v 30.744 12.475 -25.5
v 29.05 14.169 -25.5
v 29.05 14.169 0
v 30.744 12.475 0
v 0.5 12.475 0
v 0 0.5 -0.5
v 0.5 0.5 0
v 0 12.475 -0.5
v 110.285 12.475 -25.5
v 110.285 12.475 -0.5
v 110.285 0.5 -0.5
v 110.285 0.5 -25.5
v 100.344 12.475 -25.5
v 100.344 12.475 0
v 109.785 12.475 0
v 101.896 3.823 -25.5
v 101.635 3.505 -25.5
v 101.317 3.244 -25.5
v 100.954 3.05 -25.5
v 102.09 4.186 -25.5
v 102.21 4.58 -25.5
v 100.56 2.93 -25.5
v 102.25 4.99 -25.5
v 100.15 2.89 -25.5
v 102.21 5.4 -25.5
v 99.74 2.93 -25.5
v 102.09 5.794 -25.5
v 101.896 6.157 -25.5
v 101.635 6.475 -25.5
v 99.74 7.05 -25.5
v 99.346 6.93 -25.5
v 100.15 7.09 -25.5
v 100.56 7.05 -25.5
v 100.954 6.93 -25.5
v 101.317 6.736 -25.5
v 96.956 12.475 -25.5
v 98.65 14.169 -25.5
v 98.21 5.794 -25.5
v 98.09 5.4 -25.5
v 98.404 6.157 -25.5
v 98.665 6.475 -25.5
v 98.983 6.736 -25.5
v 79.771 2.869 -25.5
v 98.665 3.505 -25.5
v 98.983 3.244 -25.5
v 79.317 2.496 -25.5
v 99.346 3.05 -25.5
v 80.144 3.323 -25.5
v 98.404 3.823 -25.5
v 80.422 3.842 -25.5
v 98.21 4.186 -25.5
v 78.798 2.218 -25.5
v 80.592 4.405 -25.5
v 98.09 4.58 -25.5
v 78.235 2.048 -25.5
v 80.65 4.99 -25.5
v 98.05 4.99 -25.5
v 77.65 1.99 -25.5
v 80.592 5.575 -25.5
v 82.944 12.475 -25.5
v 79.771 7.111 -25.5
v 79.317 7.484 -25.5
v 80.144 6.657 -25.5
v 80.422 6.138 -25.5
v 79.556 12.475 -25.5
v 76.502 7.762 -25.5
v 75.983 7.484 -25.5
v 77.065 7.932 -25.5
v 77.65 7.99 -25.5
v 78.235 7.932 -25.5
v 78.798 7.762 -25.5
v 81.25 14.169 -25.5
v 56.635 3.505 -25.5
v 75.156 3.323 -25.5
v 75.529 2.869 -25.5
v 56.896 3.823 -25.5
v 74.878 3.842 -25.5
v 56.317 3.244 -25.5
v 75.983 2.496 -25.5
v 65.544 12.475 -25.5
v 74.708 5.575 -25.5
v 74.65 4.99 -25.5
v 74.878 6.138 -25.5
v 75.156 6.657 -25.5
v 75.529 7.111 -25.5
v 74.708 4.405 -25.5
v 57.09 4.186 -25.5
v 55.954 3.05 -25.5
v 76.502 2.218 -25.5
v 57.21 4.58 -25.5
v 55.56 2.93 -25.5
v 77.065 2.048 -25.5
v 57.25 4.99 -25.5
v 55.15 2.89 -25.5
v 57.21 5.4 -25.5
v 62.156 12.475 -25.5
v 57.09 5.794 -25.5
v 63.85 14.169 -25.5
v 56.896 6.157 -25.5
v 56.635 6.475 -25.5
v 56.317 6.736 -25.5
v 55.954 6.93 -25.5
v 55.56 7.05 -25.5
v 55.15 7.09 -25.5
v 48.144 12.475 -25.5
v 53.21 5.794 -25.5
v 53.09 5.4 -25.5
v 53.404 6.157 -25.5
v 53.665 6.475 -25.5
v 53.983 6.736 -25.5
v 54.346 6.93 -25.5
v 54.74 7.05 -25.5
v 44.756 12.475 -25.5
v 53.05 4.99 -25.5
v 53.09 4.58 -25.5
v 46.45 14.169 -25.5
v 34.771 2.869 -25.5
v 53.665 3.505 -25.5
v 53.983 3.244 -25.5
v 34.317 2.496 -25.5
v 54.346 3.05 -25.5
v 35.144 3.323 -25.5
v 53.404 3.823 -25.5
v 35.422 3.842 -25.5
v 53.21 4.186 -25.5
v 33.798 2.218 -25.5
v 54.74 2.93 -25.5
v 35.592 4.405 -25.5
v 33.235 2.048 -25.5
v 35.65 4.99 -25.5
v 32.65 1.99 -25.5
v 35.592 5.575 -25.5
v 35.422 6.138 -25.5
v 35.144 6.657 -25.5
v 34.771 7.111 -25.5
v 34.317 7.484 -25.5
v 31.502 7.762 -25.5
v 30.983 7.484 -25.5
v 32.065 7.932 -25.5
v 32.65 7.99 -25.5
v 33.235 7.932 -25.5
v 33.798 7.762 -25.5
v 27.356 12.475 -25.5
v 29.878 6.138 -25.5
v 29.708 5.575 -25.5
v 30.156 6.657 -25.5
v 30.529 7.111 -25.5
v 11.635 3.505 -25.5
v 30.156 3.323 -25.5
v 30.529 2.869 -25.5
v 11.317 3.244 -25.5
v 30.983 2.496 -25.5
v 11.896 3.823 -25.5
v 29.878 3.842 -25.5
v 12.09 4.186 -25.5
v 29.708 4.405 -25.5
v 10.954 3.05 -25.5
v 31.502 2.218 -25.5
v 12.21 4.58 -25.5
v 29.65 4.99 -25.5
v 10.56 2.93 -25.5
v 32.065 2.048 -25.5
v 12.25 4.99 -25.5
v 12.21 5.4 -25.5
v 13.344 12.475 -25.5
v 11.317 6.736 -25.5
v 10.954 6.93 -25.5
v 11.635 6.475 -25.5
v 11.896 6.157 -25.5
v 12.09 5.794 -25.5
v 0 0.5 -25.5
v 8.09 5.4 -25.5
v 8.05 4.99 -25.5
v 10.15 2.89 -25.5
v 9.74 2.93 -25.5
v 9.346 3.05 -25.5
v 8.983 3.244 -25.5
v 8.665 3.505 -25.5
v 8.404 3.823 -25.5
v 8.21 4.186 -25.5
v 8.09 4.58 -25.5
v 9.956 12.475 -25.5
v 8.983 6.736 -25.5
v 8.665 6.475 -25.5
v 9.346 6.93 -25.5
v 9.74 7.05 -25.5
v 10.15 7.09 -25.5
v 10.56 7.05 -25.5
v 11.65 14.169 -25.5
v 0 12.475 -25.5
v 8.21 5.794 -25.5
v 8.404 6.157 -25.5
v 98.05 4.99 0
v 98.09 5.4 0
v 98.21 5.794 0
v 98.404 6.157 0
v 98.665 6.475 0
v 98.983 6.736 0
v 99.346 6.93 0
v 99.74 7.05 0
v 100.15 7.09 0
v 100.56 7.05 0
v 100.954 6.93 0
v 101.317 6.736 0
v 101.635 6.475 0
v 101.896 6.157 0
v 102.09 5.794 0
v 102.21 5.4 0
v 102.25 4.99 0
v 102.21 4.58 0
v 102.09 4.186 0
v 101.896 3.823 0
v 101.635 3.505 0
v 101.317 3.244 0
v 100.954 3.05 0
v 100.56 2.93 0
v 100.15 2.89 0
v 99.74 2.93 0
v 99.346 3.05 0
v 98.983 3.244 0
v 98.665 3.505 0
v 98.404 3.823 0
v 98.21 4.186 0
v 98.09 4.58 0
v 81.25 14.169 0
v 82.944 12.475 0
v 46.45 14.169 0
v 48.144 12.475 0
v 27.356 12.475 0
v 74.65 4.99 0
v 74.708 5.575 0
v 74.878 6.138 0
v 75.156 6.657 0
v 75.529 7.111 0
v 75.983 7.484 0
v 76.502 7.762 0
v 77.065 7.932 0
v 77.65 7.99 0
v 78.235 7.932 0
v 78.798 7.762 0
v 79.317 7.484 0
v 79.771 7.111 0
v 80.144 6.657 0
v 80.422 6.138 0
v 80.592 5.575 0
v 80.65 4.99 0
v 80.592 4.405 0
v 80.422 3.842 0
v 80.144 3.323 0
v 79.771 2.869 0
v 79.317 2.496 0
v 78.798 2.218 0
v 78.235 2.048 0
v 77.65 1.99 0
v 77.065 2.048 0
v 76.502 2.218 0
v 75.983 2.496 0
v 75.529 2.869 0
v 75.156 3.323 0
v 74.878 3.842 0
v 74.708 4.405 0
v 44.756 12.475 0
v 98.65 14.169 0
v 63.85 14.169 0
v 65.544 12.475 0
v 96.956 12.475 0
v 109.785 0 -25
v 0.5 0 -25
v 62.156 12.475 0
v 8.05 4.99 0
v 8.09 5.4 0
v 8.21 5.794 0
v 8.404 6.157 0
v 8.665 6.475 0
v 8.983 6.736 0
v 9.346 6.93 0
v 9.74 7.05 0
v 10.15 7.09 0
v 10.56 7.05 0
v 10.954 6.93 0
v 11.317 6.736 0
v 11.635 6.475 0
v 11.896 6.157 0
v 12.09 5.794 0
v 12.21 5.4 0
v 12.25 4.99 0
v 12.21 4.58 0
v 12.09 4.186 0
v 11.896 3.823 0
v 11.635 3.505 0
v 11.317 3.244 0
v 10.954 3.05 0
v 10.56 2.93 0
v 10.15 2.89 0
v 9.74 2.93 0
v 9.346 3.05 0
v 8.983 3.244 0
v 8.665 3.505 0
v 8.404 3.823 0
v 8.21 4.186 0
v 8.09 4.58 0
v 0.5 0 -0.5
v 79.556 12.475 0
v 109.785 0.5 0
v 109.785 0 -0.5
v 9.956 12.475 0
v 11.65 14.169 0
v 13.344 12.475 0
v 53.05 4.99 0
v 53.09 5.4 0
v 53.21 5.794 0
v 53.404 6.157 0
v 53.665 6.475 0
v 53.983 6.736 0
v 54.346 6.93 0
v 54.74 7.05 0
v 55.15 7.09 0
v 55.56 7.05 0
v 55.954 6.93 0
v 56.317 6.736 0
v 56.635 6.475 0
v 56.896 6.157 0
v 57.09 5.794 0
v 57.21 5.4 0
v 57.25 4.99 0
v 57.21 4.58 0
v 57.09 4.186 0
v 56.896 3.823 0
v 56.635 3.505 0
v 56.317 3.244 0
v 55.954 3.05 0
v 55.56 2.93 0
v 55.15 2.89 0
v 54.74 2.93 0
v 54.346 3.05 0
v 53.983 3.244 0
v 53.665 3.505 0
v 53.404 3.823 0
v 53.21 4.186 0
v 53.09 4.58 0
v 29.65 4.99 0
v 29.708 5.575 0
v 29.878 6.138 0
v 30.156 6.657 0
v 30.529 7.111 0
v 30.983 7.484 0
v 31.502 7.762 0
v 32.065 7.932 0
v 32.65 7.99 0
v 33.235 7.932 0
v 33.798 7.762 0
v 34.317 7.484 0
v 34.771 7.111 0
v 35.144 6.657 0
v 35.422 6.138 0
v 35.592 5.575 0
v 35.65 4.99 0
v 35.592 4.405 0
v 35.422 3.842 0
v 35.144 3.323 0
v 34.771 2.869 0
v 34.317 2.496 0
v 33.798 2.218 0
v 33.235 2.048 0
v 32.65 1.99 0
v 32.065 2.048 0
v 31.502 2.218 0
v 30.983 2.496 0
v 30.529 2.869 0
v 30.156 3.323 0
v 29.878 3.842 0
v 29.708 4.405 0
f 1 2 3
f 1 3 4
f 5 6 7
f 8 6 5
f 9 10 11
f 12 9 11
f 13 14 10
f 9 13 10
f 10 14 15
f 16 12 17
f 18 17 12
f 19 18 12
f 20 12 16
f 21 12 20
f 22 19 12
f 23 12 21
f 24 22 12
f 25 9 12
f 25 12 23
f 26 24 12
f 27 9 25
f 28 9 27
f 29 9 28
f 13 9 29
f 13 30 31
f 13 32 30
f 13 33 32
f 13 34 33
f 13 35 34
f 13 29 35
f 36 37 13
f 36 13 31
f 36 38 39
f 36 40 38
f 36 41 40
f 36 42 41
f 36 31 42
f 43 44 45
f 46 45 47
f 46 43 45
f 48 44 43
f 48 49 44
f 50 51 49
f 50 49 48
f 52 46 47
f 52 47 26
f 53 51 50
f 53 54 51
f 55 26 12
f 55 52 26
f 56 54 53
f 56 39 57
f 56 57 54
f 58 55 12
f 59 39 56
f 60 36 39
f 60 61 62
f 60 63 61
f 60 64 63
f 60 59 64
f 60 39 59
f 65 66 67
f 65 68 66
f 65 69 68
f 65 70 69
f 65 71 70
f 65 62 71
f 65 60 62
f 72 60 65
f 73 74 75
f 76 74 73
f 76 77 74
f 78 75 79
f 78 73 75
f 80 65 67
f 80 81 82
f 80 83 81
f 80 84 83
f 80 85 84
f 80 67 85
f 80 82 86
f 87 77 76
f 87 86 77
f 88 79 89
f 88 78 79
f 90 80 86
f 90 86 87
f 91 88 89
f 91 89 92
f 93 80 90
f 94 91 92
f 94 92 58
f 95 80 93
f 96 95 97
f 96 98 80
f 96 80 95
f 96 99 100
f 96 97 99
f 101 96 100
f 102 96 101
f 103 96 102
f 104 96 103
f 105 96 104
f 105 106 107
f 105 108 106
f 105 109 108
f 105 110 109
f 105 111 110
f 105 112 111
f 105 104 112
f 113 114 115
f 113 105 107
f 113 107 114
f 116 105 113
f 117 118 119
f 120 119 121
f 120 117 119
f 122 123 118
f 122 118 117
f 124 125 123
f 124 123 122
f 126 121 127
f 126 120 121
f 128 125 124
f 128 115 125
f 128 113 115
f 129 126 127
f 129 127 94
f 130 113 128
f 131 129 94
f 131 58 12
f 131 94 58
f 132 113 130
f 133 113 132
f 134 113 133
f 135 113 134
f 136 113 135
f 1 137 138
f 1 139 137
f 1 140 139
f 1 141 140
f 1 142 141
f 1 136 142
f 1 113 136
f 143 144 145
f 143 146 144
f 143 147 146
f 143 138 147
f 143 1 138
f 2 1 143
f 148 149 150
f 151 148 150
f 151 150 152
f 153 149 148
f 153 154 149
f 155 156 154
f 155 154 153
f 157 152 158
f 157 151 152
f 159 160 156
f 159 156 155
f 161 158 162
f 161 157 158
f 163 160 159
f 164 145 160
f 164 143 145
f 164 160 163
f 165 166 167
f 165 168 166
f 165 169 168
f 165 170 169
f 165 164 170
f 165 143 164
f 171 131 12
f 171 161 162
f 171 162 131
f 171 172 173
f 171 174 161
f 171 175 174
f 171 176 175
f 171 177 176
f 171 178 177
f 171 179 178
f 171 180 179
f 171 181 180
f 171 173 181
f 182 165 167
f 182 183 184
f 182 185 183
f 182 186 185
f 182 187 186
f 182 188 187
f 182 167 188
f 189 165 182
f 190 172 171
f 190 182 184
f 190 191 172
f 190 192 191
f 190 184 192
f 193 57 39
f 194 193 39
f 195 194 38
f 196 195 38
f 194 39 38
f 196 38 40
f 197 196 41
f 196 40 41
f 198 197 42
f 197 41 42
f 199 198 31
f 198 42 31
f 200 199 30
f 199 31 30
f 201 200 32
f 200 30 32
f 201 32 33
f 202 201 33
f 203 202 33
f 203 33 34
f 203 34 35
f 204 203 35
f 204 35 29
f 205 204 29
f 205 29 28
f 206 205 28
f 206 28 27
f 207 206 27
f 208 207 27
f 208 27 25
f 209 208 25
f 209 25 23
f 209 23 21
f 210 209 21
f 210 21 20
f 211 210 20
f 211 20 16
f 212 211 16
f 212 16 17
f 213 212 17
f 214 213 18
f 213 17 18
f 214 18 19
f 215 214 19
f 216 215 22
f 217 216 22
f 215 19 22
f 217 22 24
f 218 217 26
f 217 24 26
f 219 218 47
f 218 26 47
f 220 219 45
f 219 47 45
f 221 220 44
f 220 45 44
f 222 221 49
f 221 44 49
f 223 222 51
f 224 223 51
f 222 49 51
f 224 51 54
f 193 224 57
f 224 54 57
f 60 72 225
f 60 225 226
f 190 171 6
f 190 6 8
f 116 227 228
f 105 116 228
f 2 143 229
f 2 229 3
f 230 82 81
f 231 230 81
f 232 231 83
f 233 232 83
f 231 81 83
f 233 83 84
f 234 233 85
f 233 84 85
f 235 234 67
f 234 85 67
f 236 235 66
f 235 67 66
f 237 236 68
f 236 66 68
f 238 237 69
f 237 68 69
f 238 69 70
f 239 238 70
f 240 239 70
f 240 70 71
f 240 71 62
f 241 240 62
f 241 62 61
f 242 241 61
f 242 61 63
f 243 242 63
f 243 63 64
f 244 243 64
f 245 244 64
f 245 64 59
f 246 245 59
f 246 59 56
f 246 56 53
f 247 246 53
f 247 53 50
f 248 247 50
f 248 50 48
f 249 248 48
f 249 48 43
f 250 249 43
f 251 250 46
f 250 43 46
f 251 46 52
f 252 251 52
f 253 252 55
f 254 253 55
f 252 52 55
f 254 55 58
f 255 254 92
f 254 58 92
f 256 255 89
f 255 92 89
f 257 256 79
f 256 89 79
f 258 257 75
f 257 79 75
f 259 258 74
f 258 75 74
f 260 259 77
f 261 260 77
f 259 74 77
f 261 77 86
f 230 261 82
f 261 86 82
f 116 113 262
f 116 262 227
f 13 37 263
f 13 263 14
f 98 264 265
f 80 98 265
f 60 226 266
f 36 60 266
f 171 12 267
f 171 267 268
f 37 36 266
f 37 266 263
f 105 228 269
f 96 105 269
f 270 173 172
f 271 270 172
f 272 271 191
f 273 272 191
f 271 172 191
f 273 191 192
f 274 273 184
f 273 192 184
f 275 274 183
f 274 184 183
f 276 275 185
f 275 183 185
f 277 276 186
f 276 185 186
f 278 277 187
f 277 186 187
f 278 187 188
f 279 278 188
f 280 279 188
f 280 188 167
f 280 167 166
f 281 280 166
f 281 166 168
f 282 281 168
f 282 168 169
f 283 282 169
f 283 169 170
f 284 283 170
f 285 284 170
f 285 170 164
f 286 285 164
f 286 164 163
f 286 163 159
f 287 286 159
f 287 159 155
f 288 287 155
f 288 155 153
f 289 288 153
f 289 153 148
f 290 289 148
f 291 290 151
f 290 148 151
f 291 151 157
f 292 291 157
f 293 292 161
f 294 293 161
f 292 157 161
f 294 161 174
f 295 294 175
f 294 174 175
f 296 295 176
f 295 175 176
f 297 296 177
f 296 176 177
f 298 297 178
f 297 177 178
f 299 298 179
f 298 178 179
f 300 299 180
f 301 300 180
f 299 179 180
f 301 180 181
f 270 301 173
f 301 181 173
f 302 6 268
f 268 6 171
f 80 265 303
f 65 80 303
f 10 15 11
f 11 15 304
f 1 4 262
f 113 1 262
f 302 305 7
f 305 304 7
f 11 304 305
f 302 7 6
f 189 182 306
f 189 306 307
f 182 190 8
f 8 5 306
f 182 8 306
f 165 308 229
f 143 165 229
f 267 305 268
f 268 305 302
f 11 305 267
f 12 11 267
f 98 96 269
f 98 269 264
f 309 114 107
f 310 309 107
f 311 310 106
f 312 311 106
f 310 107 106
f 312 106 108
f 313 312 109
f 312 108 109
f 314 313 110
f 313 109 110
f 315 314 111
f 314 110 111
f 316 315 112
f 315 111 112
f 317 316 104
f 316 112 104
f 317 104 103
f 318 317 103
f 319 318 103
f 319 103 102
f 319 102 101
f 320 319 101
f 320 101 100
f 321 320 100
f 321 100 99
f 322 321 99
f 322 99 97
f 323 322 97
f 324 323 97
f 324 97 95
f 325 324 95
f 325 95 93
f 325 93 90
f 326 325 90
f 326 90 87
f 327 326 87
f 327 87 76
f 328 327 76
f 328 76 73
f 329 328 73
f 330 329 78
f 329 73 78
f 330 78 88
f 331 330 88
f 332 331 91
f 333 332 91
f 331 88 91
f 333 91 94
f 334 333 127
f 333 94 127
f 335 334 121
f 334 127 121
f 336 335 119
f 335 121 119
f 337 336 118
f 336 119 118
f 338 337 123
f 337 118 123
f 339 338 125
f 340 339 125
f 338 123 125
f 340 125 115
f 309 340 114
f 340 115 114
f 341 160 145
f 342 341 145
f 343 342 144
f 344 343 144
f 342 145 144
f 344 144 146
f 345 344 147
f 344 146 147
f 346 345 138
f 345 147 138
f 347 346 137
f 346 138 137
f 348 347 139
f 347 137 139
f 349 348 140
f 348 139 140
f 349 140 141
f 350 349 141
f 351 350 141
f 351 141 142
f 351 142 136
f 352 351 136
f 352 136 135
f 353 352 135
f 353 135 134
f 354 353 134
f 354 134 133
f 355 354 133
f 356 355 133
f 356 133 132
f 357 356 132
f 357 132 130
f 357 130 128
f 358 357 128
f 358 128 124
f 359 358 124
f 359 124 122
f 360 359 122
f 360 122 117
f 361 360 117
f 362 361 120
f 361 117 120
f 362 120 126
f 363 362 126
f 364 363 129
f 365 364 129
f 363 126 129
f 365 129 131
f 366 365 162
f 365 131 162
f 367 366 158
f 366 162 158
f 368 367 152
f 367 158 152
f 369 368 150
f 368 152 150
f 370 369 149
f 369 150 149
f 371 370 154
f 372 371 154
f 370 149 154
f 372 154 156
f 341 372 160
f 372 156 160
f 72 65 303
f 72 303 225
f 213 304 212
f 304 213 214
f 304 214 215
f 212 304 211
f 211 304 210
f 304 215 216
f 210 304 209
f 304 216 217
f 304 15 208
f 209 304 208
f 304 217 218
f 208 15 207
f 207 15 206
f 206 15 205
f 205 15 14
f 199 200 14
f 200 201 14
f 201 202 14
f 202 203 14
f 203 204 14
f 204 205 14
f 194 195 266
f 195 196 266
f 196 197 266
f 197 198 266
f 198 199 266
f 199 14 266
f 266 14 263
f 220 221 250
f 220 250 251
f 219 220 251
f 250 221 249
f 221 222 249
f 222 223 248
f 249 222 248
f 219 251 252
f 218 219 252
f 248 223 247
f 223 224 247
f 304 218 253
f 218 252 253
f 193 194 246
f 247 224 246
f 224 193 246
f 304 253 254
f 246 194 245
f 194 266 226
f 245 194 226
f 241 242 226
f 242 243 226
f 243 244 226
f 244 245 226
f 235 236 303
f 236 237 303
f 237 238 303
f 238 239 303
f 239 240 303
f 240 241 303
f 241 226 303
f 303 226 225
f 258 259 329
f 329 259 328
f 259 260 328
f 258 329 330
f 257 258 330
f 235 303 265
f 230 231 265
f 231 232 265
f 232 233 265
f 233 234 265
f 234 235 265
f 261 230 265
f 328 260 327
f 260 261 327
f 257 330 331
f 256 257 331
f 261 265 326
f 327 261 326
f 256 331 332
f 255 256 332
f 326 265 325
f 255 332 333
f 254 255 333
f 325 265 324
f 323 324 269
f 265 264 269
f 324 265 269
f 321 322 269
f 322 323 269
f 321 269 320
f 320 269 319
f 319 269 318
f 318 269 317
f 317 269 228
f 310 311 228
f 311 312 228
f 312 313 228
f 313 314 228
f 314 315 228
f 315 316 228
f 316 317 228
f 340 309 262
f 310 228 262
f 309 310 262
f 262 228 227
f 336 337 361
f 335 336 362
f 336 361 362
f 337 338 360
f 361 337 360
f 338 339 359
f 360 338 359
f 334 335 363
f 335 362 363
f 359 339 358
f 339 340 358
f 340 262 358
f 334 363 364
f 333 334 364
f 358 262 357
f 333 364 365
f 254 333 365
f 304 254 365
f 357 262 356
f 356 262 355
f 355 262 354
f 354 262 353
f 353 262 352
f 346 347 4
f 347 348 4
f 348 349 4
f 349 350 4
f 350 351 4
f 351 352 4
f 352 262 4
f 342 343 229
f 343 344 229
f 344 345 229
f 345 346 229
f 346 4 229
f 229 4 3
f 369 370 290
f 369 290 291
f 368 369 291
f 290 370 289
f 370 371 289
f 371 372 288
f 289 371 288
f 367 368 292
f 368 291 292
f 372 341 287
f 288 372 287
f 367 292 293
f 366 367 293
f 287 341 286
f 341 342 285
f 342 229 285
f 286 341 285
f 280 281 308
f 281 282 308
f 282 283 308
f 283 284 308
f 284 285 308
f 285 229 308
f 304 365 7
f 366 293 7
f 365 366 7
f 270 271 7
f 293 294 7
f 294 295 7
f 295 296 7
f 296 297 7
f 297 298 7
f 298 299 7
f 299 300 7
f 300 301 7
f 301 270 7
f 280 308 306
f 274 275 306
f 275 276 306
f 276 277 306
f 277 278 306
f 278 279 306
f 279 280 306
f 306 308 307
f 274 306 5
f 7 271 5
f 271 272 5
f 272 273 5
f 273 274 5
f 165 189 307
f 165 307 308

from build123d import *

# Parameters (mm, degrees)
EXTRUDE_1_DEPTH     = 25.5
M5X0_81_D           = 4.2
HOLE_WIZARD_6_0_1_D = 6
CHAMFER_1_SIZE      = 0.5


with BuildPart() as part:
    # Эскиз1 → Бобышка-Вытянуть1 (new body)
    with BuildSketch(Plane.XY):
        Polygon((110.285, 12.475), (110.285, 0), (0, 0), (0, 12.475), (9.956213203, 12.475), (11.65, 14.168786797), (13.343786797, 12.475), (27.356213203, 12.475), (29.05, 14.168786797), (30.743786797, 12.475), (44.756213203, 12.475), (46.45, 14.168786797), (48.143786797, 12.475), (62.156213203, 12.475), (63.85, 14.168786797), (65.543786797, 12.475), (79.556213203, 12.475), (81.25, 14.168786797), (82.943786797, 12.475), (96.956213203, 12.475), (98.65, 14.168786797), (100.343786797, 12.475), align=None)
    extrude(amount=-EXTRUDE_1_DEPTH)

    # Отверстие обработанное метчиком M5x0.81 (through all)
    with Locations(Plane(origin=(-77.729263736, 6.808390477, 0), x_dir=(1, 0, 0), z_dir=(0, 0, 1))):
        with Locations((132.879263736, -1.818390477), (87.879263736, -1.818390477), (177.879263736, -1.818390477)):
            Hole(M5X0_81_D / 2)

    # Отверстия под штифты Ø6.0 мм1 (through all)
    with Locations(Plane.XY):
        with Locations((32.65, 4.99), (77.65, 4.99)):
            Hole(HOLE_WIZARD_6_0_1_D / 2)

    # Фаска1
    chamfer_1_edges = [part.edges().sort_by_distance(p)[0] for p in [
        (0, 6.2375, 0),
        (55.1425, 0, 0),
        (110.285, 6.2375, 0),
        (0, 0, -12.75),
        (110.285, 0, -12.75),
        (55.1425, 0, -25.5),
    ]]
    chamfer(chamfer_1_edges, length=CHAMFER_1_SIZE)


solid = part.part
